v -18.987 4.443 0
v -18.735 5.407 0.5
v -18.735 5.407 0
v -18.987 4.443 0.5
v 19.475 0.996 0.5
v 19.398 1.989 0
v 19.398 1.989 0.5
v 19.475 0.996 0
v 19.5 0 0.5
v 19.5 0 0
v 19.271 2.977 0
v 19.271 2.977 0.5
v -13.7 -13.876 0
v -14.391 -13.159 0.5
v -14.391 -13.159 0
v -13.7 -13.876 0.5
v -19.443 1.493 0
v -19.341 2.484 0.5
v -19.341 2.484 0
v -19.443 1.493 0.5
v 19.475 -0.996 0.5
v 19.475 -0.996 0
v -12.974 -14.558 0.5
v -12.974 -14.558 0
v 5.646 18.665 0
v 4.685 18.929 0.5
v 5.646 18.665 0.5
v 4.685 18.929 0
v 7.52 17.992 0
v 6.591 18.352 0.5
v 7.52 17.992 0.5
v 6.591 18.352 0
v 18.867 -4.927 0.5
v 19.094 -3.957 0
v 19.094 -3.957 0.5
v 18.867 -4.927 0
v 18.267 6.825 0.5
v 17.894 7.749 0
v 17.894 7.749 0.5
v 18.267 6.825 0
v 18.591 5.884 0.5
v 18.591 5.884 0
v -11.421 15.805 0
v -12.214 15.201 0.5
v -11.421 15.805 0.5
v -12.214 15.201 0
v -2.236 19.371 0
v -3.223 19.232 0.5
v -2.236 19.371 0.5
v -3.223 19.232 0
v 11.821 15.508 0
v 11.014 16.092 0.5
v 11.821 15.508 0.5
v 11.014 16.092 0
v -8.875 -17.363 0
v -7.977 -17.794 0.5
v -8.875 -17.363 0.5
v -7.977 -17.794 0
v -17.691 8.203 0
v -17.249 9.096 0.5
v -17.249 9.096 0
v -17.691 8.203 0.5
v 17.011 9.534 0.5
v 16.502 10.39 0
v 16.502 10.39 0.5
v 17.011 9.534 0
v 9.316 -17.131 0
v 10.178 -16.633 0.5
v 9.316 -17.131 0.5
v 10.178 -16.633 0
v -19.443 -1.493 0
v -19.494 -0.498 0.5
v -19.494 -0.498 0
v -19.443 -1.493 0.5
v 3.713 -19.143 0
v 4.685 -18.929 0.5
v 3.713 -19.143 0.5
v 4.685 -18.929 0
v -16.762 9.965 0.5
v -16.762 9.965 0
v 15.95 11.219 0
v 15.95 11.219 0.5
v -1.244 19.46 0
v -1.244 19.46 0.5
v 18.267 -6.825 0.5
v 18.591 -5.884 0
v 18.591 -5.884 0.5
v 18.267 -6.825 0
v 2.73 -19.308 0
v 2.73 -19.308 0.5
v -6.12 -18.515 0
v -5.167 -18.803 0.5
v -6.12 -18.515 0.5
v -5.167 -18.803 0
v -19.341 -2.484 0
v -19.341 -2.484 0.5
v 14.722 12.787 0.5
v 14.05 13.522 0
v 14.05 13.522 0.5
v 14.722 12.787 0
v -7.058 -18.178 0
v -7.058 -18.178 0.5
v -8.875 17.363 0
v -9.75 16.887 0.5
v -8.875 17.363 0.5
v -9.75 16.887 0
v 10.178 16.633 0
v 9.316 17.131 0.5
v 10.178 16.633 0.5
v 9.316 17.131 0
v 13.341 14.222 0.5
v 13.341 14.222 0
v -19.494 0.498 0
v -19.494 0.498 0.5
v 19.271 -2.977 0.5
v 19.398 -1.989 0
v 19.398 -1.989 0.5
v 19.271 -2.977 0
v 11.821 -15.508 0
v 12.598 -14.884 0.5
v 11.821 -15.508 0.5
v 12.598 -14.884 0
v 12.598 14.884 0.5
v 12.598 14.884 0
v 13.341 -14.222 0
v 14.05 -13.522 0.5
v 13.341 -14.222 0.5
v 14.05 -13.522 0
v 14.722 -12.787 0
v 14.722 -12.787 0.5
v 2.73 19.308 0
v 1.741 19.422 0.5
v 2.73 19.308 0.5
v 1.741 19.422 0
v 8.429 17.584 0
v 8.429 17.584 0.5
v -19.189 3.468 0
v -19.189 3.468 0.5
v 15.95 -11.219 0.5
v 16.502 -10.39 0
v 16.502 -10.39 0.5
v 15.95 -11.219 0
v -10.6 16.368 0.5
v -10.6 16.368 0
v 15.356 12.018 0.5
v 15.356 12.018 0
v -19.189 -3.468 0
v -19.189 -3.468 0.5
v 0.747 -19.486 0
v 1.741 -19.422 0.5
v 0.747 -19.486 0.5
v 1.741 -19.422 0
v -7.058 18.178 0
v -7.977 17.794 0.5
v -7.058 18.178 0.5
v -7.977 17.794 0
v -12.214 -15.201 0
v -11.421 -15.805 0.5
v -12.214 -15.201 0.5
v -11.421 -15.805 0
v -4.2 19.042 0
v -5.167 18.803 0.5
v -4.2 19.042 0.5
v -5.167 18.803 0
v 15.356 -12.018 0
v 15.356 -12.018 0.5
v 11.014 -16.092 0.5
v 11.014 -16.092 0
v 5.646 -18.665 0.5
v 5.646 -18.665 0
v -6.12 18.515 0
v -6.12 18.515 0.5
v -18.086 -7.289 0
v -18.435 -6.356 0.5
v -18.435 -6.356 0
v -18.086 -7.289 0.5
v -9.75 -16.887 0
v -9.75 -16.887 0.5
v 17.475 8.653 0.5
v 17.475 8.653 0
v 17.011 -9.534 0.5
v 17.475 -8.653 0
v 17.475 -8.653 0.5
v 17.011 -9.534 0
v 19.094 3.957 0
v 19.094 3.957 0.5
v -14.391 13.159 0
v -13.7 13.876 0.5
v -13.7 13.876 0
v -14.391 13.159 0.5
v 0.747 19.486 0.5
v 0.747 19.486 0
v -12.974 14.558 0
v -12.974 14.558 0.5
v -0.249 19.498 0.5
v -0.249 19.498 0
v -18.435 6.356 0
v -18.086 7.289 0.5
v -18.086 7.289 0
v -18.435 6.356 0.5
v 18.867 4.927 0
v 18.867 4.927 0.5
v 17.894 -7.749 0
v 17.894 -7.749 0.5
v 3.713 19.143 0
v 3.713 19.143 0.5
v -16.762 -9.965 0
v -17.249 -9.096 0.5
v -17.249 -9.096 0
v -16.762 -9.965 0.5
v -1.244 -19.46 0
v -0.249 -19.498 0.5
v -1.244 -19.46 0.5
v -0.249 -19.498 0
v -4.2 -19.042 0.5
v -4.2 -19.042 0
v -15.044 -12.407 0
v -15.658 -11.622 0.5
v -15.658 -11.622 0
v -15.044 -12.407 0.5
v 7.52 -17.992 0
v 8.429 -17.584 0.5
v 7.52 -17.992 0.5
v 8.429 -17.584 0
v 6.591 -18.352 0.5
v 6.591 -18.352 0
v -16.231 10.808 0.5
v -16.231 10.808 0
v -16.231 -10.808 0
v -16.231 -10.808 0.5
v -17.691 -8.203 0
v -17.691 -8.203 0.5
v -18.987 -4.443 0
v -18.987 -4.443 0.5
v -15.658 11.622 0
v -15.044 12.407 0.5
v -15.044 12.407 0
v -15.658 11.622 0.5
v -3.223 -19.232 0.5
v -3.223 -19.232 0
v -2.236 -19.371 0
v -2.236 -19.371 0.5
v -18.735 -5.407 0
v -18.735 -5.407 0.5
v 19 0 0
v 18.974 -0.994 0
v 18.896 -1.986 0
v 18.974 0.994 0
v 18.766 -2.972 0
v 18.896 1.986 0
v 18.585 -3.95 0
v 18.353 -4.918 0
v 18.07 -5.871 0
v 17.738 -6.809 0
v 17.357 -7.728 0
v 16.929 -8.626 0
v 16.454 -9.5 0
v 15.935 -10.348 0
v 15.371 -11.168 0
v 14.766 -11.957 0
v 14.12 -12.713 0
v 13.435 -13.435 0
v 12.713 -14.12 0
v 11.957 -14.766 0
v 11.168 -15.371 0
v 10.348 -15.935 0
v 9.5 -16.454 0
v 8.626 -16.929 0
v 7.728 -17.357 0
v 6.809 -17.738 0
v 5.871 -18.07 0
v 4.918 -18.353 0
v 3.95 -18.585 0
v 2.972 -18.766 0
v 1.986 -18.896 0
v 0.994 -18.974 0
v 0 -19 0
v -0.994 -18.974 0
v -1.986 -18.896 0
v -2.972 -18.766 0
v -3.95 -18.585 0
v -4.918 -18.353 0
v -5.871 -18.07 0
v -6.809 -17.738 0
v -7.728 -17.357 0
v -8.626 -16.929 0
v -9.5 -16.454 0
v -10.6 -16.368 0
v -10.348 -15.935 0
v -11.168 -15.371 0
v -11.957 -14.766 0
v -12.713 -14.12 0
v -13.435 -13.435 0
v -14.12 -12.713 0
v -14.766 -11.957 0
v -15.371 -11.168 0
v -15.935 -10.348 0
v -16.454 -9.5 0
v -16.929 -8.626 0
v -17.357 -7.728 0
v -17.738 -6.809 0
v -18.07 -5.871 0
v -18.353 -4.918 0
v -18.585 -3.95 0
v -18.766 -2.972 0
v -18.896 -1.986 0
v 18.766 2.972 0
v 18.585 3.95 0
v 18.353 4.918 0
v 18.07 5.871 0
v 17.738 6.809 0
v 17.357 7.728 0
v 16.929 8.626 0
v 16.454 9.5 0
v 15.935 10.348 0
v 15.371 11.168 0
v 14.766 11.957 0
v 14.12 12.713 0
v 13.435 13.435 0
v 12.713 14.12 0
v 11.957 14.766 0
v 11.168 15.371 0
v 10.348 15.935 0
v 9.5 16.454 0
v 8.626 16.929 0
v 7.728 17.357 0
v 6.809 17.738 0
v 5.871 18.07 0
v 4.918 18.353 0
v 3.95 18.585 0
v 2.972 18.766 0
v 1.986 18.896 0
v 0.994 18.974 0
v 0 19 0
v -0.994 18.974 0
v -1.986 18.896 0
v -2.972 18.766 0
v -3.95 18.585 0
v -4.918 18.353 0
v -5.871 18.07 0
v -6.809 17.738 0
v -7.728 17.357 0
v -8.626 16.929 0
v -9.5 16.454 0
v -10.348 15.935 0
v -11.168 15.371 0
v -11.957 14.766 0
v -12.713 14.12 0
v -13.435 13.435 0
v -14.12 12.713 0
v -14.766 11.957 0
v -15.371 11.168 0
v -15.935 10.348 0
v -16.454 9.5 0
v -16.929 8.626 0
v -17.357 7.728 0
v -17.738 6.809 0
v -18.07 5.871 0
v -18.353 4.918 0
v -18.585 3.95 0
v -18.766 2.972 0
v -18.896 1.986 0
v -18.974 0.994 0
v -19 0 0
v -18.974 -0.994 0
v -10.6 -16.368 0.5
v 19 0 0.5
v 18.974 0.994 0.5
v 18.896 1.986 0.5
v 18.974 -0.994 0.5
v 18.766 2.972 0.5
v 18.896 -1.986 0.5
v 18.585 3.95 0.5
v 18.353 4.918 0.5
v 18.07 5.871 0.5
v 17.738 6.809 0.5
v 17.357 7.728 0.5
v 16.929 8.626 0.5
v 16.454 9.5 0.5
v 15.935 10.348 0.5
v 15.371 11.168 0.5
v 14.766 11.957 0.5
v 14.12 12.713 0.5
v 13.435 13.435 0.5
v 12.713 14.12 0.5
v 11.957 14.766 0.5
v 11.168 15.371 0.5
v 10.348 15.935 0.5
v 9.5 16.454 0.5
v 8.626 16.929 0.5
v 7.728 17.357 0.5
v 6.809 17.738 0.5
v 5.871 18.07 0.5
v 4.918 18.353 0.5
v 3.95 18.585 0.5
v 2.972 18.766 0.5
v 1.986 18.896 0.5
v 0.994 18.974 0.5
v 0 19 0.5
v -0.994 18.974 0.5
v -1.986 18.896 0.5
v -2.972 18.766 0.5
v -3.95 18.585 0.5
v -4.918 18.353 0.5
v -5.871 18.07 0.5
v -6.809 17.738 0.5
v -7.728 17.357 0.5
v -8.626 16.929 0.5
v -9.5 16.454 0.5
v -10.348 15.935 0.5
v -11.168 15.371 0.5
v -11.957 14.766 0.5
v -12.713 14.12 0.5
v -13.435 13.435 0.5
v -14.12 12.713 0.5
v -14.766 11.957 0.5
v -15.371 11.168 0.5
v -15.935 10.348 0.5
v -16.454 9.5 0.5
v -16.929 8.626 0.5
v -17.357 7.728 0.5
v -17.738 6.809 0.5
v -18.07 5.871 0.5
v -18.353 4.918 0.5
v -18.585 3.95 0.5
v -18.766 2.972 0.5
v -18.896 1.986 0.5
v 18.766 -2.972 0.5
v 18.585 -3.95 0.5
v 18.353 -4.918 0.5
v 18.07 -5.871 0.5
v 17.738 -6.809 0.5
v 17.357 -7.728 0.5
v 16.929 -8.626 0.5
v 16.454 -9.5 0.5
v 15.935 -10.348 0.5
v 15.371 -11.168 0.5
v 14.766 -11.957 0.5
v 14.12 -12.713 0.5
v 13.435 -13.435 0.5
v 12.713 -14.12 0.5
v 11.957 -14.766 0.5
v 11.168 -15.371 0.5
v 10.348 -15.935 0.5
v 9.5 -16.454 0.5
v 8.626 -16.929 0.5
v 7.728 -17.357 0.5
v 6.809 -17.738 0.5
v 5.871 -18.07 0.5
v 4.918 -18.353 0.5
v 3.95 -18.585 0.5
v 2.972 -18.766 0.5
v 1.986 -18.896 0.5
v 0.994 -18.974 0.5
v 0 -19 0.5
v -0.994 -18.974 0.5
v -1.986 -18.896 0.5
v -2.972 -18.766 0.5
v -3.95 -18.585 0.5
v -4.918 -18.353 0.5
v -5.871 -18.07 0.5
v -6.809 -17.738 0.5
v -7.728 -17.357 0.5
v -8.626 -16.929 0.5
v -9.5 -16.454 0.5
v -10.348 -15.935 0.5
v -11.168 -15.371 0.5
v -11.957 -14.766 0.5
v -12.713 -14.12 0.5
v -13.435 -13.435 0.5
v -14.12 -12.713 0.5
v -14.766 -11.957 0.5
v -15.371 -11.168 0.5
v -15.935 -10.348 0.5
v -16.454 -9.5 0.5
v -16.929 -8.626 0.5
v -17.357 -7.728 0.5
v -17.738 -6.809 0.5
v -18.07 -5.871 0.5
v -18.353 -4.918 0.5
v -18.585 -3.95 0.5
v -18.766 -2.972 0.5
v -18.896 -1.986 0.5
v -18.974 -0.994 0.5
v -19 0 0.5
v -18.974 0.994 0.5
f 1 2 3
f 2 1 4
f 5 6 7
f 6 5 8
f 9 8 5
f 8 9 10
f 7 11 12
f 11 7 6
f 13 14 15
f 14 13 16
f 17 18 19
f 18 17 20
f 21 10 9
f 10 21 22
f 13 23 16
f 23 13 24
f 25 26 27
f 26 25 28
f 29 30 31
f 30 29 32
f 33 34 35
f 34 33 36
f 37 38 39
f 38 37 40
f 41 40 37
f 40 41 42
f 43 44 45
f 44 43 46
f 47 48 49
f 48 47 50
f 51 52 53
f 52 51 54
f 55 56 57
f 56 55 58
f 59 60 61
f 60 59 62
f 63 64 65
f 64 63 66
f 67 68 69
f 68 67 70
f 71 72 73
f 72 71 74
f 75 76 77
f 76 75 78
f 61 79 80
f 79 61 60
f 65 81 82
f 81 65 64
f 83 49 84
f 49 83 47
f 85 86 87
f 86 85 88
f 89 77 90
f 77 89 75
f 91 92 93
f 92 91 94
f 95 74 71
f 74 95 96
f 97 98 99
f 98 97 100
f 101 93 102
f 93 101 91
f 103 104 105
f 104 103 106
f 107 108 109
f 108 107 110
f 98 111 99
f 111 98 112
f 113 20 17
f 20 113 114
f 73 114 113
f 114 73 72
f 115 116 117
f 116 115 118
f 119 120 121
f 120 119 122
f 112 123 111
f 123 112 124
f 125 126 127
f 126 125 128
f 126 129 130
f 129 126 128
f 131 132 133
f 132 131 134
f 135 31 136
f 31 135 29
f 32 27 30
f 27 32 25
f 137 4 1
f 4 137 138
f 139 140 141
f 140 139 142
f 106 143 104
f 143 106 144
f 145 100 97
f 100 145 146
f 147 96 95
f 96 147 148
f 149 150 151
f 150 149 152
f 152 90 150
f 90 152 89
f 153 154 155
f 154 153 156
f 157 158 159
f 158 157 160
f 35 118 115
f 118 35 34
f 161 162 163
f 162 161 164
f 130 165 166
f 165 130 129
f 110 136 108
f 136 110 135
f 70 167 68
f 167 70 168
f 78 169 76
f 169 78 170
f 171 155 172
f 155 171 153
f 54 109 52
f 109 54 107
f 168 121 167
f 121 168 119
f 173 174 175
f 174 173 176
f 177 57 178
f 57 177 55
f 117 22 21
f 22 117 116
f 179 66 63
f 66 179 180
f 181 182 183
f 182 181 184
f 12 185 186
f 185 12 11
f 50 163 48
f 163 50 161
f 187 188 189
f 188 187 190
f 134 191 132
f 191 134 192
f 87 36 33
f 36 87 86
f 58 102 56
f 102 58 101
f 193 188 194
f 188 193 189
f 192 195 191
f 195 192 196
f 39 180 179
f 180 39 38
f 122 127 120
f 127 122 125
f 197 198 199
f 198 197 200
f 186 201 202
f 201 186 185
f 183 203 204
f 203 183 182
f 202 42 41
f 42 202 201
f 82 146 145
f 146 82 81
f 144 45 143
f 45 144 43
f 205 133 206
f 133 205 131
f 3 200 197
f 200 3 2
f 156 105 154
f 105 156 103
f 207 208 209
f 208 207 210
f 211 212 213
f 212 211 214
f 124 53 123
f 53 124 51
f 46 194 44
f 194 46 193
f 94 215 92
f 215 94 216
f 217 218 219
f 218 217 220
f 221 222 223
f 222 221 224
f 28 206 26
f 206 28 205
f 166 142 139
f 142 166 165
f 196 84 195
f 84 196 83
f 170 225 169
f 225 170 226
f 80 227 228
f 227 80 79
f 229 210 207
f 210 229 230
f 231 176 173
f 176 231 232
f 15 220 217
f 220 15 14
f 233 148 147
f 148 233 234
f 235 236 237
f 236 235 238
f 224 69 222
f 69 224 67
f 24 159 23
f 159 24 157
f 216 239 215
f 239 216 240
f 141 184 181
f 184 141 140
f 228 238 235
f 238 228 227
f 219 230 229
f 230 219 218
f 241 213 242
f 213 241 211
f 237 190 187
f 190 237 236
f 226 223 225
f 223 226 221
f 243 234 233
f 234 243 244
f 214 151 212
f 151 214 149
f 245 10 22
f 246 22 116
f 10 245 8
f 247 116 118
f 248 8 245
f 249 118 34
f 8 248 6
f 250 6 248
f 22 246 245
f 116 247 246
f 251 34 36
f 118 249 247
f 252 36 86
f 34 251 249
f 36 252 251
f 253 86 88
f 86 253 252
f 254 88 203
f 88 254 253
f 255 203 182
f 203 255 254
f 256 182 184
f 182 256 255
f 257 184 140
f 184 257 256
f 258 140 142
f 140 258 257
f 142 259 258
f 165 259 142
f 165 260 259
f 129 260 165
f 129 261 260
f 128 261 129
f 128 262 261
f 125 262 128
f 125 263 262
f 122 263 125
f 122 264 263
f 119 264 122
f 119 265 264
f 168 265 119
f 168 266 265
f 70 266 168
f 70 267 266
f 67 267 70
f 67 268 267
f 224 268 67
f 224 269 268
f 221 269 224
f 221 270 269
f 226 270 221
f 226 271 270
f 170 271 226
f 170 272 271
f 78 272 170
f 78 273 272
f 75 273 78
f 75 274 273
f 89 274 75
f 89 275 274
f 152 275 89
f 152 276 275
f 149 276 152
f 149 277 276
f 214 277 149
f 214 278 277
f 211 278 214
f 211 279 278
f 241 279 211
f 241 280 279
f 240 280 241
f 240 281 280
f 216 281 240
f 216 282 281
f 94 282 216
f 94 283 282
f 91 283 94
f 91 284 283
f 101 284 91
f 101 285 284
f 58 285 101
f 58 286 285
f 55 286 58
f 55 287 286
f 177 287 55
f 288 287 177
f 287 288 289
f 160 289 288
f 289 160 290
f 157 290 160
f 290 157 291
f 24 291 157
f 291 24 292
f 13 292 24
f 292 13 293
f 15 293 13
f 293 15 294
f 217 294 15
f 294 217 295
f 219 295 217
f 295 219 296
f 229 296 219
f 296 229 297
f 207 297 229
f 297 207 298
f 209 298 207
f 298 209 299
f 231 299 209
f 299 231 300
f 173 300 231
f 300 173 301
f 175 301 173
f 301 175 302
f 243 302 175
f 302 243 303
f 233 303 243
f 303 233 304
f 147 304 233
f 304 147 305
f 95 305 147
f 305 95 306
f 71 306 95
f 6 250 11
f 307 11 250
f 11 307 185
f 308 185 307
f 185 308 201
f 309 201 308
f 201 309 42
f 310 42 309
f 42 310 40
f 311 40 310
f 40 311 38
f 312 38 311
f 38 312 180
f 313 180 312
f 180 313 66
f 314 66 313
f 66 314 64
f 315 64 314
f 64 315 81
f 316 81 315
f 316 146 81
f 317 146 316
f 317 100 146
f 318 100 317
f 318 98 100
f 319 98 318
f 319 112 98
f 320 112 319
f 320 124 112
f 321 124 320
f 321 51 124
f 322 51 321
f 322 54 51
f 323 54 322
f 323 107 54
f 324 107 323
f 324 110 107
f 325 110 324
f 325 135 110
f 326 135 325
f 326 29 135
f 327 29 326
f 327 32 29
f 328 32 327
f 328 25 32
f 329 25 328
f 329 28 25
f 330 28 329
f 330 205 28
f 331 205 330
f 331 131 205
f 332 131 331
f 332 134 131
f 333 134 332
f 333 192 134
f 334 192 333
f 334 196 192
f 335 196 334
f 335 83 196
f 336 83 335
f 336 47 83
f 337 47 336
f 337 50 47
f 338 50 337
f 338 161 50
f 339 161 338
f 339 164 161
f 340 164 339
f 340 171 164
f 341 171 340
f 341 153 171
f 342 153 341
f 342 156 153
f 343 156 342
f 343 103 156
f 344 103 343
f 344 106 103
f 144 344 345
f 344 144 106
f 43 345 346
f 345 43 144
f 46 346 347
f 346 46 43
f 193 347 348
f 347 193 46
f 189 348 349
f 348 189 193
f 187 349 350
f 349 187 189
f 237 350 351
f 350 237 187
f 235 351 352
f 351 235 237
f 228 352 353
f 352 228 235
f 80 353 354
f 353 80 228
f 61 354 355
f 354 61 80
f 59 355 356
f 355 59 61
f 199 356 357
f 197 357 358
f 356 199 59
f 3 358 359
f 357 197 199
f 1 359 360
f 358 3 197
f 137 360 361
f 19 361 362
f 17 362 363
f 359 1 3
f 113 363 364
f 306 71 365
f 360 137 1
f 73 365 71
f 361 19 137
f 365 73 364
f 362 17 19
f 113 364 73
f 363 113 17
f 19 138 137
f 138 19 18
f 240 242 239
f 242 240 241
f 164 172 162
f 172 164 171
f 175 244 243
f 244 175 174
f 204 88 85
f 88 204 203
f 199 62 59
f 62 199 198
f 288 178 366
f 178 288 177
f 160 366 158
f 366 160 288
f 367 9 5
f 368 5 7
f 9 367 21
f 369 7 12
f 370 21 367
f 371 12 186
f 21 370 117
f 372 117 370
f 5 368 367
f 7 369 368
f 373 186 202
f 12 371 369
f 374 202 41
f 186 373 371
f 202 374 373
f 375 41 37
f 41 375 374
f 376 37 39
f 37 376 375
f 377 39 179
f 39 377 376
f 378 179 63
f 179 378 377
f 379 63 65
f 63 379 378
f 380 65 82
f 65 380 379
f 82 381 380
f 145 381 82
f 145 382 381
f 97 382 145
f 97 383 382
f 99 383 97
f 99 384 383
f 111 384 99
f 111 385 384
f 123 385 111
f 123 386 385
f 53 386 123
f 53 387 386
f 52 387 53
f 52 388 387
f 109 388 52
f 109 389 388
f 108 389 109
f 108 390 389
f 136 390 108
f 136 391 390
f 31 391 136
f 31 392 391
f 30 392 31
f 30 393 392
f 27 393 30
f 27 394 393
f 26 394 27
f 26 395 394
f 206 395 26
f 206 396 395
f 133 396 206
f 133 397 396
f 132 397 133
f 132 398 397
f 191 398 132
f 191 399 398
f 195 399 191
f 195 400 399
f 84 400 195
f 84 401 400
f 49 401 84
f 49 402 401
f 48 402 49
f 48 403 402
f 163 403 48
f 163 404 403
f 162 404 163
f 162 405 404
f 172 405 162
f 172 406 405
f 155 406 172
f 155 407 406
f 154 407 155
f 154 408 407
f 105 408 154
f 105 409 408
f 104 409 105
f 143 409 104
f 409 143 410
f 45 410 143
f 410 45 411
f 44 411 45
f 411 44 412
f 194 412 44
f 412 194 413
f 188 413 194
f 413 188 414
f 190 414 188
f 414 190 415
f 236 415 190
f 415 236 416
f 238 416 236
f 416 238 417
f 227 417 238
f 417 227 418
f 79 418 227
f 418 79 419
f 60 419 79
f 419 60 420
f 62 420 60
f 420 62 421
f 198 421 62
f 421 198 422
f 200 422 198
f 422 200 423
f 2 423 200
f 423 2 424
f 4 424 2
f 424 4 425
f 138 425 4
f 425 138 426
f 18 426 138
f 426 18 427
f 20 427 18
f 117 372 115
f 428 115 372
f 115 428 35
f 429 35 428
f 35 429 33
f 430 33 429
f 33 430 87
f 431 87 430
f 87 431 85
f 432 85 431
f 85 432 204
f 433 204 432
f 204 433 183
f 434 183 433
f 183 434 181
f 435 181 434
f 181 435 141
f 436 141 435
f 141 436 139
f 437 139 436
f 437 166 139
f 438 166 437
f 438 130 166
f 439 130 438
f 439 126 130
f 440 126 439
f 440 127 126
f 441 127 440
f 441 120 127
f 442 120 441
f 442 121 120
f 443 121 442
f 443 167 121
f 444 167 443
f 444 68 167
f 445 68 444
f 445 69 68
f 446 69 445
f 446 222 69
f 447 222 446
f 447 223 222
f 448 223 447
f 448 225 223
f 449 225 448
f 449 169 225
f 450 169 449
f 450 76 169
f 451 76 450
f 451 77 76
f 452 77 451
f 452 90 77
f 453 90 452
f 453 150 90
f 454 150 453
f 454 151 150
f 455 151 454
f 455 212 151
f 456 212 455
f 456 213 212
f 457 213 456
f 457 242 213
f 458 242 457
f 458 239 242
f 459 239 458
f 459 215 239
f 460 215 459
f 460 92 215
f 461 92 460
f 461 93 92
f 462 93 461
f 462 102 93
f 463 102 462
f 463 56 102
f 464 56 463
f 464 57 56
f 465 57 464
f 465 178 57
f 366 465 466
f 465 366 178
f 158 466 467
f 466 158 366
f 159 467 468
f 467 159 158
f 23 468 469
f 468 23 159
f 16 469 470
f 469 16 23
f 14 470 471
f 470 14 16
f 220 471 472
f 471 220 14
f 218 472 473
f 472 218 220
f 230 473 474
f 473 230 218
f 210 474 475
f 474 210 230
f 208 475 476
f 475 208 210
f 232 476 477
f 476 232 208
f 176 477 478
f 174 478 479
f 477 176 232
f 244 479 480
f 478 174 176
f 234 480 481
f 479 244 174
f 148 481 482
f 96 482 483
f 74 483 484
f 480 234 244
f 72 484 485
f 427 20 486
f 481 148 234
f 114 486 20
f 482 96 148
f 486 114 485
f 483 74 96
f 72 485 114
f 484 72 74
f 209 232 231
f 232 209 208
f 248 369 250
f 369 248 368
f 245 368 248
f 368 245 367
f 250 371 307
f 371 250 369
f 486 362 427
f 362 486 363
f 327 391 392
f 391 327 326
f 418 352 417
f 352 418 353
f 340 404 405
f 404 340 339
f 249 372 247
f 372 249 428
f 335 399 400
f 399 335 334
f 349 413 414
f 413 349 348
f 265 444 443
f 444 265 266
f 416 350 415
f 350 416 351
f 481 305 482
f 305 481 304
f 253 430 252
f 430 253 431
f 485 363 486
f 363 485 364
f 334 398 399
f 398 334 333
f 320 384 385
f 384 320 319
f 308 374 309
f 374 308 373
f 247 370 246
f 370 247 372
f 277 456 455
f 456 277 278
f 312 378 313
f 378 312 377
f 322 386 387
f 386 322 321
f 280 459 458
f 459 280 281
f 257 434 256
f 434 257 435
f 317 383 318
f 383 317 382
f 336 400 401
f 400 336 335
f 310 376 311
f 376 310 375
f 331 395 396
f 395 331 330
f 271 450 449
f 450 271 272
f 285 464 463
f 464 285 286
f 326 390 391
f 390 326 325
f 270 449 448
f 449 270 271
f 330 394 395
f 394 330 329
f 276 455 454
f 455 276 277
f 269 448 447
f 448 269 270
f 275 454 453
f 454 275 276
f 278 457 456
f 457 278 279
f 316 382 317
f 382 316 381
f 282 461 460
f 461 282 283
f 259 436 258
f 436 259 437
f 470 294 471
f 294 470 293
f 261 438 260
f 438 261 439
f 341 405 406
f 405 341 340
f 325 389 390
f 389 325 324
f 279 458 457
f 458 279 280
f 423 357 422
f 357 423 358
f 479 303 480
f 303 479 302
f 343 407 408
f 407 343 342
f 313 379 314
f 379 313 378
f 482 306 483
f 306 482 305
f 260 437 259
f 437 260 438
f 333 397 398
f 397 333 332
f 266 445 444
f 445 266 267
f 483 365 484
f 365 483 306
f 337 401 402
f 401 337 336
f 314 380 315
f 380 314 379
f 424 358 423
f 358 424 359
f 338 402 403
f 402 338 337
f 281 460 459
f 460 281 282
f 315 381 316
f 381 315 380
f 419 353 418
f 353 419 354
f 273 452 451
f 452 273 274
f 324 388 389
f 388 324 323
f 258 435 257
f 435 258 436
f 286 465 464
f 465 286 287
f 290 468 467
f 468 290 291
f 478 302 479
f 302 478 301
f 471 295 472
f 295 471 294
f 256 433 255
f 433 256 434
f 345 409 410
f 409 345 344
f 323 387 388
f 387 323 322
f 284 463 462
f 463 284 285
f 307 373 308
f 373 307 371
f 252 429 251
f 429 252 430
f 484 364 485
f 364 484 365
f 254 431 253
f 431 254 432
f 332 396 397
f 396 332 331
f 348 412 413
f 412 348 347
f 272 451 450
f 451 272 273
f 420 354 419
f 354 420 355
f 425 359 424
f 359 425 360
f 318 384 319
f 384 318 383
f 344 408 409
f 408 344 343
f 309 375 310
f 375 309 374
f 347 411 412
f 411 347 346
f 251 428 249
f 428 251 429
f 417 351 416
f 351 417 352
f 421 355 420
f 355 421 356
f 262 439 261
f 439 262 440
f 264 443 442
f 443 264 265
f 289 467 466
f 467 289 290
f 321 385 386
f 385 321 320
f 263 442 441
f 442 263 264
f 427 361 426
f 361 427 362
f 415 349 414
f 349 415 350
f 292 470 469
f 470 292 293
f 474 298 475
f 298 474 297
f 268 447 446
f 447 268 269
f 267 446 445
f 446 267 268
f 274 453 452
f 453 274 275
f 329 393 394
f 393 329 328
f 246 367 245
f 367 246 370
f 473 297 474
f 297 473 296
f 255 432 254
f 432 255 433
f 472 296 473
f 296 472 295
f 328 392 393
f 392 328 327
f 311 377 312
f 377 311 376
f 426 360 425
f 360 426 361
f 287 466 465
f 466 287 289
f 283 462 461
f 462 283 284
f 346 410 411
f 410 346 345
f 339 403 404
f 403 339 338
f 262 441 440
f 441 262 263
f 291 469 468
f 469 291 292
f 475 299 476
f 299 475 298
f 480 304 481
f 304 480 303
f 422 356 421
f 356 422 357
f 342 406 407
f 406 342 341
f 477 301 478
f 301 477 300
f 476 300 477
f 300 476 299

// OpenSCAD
// file: coin.scad
// Challenge coin generator.
// All dimensions in millimeters.

use <write.scad>

// Epsilon
E = 0.01;


module coin(
       top_text="",      // Text of centered top text
       bottom_text="",   // Text of centered bottom text
       size=39,          // Diameter of coin
       thickness=3.2,    // Total coin thickness
       relief=0.5,       // Height of raised (relief) features
       text_height=5.0,  // Height of a text letter
       rim_width=0.5     // Rim edge thickness
       ) {
  ring(r=size / 2, thickness=rim_width, height=relief);
  arc_text(text=top_text, text_height=text_height, height=relief,
           r=size / 2 - rim_width * 3, top=true);
  arc_text(text=bottom_text, text_height=text_height, height=relief,
           r=size / 2 - rim_width * 3, top=false);
}

module arc_text(text, text_height, height, r, top=true) {
  ang = 1.1 * atan2(text_height, r);
  start_ang = (len(text) - 1) / 2 * ang;
  ang_sgn = top ? -1 : 1;
  offset_sgn = top ? 1 : -1;
  for (i = [0 : len(text) - 1]) {
    rotate(a=ang_sgn * (ang * i - start_ang), v=[0, 0, 1])
      translate([0, offset_sgn * (r - text_height / 2), height / 2])
        write(text[i], h=text_height, t=height, center=true, font="Letters.dxf");
  }
}

// Ring around origin (at z=0)
module ring(r, thickness, height) {
  translate([0, 0, height / 2]) {
    difference() {
      cylinder(h=height, r=r, $fa=1, $fs=1, center=true);
      cylinder(h=height + E, r=r - thickness, $fa=1, $fs=1, center=true);
    }
  }
}

coin(top_text="HELLO", bottom_text="World");
// main file
use <coin.scad>

coin(top_text="Debbie Koss",
     bottom_text="August 8, 2013",
     rev_top_text="Happy Birthday!",
     rev_bottom_text="from Mike",
     text_height=5.0,
     spacing=0.8);
